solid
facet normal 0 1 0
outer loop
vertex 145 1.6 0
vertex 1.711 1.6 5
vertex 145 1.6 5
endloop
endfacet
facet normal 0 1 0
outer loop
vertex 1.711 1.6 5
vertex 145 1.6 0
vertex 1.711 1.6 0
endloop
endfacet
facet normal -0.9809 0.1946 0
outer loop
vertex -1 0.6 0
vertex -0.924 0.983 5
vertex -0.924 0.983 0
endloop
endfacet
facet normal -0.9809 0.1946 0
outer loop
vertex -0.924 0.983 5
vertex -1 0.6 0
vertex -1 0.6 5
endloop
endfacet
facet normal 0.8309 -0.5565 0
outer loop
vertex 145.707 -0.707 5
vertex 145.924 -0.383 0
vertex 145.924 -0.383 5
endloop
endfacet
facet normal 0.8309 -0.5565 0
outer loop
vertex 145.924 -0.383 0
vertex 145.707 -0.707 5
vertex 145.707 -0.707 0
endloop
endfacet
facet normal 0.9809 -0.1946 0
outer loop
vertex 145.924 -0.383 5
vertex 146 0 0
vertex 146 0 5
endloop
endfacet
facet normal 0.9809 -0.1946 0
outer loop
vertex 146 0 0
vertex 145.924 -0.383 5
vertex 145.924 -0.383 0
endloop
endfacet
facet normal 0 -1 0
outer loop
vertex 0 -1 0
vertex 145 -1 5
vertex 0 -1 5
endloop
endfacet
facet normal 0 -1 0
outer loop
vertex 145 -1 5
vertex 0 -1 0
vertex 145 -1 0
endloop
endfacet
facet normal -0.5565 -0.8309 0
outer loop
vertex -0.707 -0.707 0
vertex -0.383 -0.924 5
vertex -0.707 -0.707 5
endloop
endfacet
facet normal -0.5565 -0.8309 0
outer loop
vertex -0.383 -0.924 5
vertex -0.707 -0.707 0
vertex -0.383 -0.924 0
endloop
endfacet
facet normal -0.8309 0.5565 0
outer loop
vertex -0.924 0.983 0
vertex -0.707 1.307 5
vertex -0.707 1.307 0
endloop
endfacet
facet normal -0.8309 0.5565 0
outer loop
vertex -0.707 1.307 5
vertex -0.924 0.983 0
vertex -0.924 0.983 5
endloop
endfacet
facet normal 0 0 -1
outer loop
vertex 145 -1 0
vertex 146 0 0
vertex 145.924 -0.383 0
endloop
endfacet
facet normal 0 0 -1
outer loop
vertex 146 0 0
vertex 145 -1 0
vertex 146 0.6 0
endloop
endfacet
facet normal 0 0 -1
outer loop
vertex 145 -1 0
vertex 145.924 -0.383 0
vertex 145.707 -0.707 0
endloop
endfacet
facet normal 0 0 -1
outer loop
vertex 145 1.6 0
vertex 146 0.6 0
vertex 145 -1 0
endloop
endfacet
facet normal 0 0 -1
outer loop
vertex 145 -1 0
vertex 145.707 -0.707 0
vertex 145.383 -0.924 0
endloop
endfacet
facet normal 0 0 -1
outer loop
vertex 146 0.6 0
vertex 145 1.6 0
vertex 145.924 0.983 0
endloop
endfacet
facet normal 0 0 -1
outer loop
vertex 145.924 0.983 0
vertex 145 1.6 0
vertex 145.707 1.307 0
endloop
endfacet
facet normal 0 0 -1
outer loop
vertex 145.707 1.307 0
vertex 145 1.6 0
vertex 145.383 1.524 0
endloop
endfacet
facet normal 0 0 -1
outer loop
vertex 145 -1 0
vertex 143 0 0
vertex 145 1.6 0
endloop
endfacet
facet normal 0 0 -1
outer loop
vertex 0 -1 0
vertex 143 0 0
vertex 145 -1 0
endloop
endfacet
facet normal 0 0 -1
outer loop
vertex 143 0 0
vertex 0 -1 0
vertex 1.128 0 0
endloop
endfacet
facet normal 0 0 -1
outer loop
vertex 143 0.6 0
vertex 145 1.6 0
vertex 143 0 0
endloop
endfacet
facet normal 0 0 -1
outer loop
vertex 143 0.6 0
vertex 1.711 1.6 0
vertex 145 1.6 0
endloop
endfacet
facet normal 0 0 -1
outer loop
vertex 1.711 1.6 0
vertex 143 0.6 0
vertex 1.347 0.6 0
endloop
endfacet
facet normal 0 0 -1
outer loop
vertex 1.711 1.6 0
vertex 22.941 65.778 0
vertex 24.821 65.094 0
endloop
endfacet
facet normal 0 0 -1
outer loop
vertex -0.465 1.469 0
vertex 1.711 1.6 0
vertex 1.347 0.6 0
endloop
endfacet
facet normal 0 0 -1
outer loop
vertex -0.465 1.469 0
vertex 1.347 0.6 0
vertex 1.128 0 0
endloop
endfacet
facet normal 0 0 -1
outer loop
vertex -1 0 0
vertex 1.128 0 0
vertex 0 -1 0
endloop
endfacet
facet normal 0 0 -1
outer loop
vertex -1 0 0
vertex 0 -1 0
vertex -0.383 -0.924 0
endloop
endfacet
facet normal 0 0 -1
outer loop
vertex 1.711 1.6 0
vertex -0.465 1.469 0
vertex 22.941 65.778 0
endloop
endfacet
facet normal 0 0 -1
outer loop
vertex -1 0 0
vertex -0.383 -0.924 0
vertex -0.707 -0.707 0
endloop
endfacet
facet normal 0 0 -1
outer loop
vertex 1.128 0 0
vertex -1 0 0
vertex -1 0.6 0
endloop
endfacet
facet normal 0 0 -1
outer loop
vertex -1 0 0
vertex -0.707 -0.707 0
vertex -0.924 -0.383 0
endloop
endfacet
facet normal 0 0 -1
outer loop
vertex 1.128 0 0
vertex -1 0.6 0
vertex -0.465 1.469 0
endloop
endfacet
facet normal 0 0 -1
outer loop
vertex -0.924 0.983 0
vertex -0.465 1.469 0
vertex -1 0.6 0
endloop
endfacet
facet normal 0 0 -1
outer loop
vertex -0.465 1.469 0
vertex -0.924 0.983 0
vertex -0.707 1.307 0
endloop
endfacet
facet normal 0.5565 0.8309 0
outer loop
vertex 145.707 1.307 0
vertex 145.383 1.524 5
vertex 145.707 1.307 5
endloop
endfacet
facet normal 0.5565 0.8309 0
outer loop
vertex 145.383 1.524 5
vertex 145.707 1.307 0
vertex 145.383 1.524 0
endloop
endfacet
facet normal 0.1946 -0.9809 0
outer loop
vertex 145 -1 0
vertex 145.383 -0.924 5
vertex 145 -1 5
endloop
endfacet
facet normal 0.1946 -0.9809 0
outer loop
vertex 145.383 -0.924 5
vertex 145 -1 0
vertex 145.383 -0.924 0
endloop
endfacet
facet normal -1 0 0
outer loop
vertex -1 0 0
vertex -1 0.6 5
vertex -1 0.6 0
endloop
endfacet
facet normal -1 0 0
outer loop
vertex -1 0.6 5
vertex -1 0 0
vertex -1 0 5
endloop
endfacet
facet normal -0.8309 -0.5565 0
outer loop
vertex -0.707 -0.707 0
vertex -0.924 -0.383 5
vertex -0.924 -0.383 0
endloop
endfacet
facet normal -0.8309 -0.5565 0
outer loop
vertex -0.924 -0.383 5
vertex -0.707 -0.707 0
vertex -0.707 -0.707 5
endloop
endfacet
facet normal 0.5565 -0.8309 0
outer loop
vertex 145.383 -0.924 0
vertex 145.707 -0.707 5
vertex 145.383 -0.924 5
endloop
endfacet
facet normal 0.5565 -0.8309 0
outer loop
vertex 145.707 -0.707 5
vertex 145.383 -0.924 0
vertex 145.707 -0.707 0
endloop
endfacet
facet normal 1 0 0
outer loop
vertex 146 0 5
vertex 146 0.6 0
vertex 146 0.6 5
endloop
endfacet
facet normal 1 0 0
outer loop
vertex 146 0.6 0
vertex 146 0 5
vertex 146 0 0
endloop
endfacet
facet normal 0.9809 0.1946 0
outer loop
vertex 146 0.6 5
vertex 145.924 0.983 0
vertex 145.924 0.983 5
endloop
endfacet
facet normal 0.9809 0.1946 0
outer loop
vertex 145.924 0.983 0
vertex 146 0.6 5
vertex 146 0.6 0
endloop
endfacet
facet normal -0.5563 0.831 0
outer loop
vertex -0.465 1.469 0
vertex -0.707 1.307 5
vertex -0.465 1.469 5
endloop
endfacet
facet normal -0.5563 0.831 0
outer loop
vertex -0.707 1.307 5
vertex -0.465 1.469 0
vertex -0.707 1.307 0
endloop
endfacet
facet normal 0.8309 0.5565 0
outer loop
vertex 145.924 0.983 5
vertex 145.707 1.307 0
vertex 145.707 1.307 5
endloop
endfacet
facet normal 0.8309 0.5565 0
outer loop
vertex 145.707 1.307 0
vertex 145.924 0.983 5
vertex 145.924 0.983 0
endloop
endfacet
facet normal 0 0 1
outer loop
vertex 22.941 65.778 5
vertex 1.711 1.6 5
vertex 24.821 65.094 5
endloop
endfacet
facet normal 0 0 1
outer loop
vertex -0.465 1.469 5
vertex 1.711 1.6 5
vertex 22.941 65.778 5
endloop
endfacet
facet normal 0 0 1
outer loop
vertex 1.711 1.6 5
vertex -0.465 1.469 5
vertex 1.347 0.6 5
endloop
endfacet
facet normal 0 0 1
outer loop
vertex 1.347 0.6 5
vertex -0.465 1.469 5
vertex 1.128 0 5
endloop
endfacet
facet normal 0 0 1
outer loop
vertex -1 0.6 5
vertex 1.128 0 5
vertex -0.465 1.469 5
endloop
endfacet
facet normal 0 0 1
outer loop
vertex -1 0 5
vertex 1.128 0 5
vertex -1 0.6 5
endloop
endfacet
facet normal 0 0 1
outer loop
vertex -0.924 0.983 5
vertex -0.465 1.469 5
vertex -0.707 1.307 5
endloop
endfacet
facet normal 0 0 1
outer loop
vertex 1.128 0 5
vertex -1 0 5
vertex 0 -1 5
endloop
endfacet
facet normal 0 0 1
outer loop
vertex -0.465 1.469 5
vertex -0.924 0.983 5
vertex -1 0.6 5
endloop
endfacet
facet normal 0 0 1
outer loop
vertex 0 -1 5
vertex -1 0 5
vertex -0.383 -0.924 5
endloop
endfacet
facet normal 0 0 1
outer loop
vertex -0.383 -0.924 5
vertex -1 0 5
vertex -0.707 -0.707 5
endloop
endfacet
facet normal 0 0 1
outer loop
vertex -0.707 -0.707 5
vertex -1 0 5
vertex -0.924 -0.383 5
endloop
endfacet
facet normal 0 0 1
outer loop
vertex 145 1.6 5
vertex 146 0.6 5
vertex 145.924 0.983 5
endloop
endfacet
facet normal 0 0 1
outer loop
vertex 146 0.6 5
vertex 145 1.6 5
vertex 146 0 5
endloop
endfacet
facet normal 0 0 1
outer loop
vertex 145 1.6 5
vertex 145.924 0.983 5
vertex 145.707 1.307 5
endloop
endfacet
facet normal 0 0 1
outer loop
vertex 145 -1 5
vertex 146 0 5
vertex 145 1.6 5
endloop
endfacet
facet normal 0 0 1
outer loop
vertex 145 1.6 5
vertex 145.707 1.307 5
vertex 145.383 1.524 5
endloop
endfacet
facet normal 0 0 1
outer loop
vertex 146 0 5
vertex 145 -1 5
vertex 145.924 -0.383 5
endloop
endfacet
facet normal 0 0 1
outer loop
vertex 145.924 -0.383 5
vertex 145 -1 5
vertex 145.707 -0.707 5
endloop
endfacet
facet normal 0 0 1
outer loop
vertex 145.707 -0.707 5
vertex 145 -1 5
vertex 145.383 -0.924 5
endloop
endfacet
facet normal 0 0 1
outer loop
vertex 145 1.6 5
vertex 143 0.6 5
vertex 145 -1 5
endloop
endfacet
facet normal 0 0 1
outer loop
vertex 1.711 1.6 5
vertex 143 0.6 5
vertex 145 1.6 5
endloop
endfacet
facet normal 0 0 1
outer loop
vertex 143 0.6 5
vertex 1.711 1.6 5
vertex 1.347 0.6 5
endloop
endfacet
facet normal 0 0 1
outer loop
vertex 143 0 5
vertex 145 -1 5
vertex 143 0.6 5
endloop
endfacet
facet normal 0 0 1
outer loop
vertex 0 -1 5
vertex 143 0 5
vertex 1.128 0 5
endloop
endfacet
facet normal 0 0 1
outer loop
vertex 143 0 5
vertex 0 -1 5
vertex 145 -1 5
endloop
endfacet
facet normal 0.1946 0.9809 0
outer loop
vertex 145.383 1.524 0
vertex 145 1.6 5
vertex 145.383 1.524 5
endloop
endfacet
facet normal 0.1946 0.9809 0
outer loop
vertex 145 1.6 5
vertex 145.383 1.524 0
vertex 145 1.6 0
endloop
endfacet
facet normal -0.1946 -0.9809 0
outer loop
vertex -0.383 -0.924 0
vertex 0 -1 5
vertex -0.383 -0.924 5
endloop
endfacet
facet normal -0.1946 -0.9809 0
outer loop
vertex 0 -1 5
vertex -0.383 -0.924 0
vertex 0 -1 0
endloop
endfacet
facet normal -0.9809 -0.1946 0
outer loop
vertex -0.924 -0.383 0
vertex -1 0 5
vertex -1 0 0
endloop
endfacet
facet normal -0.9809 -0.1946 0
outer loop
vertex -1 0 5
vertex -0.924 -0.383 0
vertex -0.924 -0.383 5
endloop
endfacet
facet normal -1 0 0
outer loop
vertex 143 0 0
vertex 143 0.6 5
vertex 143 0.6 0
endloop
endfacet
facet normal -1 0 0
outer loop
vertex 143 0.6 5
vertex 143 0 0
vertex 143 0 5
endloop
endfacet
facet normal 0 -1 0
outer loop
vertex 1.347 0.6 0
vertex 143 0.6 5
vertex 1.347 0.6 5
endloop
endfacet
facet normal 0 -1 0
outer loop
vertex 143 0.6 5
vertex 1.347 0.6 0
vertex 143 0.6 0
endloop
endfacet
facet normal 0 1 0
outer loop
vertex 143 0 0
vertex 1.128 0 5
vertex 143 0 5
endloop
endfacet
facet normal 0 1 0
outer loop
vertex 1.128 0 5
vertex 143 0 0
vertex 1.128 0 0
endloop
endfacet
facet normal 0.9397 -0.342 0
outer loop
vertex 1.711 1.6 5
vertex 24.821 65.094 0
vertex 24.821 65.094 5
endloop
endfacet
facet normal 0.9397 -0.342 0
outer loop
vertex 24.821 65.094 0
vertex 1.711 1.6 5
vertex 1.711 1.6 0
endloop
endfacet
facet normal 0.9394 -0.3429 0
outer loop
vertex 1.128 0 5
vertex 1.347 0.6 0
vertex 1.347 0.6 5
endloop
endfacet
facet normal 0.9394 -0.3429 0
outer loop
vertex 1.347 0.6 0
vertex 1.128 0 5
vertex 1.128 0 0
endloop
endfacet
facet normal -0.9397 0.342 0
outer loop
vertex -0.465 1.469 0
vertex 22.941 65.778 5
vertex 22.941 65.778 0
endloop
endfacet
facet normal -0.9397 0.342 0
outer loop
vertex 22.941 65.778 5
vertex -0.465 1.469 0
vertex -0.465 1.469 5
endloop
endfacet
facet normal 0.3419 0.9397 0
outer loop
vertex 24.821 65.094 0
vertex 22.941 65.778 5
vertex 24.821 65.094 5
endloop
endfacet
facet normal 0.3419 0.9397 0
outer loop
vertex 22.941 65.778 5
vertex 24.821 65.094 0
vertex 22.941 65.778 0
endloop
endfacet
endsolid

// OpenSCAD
paper_thickness = 0.6;
thickness = 1;
paper_height = 143;

$fs=0.4;
$fa=1;

difference() {
	minkowski() {
		cube([paper_height + thickness * 2, paper_thickness, 5]);
		scale([1, 1, 0]) {
			cylinder(r=thickness, h=1);
		}
	}
	cube([paper_height, paper_thickness, 5]);
}

translate([-thickness, 0, 0]) {
	rotate([0, 0, -20]) {
		cube([thickness * 2, 70, 5]);
	}
}
